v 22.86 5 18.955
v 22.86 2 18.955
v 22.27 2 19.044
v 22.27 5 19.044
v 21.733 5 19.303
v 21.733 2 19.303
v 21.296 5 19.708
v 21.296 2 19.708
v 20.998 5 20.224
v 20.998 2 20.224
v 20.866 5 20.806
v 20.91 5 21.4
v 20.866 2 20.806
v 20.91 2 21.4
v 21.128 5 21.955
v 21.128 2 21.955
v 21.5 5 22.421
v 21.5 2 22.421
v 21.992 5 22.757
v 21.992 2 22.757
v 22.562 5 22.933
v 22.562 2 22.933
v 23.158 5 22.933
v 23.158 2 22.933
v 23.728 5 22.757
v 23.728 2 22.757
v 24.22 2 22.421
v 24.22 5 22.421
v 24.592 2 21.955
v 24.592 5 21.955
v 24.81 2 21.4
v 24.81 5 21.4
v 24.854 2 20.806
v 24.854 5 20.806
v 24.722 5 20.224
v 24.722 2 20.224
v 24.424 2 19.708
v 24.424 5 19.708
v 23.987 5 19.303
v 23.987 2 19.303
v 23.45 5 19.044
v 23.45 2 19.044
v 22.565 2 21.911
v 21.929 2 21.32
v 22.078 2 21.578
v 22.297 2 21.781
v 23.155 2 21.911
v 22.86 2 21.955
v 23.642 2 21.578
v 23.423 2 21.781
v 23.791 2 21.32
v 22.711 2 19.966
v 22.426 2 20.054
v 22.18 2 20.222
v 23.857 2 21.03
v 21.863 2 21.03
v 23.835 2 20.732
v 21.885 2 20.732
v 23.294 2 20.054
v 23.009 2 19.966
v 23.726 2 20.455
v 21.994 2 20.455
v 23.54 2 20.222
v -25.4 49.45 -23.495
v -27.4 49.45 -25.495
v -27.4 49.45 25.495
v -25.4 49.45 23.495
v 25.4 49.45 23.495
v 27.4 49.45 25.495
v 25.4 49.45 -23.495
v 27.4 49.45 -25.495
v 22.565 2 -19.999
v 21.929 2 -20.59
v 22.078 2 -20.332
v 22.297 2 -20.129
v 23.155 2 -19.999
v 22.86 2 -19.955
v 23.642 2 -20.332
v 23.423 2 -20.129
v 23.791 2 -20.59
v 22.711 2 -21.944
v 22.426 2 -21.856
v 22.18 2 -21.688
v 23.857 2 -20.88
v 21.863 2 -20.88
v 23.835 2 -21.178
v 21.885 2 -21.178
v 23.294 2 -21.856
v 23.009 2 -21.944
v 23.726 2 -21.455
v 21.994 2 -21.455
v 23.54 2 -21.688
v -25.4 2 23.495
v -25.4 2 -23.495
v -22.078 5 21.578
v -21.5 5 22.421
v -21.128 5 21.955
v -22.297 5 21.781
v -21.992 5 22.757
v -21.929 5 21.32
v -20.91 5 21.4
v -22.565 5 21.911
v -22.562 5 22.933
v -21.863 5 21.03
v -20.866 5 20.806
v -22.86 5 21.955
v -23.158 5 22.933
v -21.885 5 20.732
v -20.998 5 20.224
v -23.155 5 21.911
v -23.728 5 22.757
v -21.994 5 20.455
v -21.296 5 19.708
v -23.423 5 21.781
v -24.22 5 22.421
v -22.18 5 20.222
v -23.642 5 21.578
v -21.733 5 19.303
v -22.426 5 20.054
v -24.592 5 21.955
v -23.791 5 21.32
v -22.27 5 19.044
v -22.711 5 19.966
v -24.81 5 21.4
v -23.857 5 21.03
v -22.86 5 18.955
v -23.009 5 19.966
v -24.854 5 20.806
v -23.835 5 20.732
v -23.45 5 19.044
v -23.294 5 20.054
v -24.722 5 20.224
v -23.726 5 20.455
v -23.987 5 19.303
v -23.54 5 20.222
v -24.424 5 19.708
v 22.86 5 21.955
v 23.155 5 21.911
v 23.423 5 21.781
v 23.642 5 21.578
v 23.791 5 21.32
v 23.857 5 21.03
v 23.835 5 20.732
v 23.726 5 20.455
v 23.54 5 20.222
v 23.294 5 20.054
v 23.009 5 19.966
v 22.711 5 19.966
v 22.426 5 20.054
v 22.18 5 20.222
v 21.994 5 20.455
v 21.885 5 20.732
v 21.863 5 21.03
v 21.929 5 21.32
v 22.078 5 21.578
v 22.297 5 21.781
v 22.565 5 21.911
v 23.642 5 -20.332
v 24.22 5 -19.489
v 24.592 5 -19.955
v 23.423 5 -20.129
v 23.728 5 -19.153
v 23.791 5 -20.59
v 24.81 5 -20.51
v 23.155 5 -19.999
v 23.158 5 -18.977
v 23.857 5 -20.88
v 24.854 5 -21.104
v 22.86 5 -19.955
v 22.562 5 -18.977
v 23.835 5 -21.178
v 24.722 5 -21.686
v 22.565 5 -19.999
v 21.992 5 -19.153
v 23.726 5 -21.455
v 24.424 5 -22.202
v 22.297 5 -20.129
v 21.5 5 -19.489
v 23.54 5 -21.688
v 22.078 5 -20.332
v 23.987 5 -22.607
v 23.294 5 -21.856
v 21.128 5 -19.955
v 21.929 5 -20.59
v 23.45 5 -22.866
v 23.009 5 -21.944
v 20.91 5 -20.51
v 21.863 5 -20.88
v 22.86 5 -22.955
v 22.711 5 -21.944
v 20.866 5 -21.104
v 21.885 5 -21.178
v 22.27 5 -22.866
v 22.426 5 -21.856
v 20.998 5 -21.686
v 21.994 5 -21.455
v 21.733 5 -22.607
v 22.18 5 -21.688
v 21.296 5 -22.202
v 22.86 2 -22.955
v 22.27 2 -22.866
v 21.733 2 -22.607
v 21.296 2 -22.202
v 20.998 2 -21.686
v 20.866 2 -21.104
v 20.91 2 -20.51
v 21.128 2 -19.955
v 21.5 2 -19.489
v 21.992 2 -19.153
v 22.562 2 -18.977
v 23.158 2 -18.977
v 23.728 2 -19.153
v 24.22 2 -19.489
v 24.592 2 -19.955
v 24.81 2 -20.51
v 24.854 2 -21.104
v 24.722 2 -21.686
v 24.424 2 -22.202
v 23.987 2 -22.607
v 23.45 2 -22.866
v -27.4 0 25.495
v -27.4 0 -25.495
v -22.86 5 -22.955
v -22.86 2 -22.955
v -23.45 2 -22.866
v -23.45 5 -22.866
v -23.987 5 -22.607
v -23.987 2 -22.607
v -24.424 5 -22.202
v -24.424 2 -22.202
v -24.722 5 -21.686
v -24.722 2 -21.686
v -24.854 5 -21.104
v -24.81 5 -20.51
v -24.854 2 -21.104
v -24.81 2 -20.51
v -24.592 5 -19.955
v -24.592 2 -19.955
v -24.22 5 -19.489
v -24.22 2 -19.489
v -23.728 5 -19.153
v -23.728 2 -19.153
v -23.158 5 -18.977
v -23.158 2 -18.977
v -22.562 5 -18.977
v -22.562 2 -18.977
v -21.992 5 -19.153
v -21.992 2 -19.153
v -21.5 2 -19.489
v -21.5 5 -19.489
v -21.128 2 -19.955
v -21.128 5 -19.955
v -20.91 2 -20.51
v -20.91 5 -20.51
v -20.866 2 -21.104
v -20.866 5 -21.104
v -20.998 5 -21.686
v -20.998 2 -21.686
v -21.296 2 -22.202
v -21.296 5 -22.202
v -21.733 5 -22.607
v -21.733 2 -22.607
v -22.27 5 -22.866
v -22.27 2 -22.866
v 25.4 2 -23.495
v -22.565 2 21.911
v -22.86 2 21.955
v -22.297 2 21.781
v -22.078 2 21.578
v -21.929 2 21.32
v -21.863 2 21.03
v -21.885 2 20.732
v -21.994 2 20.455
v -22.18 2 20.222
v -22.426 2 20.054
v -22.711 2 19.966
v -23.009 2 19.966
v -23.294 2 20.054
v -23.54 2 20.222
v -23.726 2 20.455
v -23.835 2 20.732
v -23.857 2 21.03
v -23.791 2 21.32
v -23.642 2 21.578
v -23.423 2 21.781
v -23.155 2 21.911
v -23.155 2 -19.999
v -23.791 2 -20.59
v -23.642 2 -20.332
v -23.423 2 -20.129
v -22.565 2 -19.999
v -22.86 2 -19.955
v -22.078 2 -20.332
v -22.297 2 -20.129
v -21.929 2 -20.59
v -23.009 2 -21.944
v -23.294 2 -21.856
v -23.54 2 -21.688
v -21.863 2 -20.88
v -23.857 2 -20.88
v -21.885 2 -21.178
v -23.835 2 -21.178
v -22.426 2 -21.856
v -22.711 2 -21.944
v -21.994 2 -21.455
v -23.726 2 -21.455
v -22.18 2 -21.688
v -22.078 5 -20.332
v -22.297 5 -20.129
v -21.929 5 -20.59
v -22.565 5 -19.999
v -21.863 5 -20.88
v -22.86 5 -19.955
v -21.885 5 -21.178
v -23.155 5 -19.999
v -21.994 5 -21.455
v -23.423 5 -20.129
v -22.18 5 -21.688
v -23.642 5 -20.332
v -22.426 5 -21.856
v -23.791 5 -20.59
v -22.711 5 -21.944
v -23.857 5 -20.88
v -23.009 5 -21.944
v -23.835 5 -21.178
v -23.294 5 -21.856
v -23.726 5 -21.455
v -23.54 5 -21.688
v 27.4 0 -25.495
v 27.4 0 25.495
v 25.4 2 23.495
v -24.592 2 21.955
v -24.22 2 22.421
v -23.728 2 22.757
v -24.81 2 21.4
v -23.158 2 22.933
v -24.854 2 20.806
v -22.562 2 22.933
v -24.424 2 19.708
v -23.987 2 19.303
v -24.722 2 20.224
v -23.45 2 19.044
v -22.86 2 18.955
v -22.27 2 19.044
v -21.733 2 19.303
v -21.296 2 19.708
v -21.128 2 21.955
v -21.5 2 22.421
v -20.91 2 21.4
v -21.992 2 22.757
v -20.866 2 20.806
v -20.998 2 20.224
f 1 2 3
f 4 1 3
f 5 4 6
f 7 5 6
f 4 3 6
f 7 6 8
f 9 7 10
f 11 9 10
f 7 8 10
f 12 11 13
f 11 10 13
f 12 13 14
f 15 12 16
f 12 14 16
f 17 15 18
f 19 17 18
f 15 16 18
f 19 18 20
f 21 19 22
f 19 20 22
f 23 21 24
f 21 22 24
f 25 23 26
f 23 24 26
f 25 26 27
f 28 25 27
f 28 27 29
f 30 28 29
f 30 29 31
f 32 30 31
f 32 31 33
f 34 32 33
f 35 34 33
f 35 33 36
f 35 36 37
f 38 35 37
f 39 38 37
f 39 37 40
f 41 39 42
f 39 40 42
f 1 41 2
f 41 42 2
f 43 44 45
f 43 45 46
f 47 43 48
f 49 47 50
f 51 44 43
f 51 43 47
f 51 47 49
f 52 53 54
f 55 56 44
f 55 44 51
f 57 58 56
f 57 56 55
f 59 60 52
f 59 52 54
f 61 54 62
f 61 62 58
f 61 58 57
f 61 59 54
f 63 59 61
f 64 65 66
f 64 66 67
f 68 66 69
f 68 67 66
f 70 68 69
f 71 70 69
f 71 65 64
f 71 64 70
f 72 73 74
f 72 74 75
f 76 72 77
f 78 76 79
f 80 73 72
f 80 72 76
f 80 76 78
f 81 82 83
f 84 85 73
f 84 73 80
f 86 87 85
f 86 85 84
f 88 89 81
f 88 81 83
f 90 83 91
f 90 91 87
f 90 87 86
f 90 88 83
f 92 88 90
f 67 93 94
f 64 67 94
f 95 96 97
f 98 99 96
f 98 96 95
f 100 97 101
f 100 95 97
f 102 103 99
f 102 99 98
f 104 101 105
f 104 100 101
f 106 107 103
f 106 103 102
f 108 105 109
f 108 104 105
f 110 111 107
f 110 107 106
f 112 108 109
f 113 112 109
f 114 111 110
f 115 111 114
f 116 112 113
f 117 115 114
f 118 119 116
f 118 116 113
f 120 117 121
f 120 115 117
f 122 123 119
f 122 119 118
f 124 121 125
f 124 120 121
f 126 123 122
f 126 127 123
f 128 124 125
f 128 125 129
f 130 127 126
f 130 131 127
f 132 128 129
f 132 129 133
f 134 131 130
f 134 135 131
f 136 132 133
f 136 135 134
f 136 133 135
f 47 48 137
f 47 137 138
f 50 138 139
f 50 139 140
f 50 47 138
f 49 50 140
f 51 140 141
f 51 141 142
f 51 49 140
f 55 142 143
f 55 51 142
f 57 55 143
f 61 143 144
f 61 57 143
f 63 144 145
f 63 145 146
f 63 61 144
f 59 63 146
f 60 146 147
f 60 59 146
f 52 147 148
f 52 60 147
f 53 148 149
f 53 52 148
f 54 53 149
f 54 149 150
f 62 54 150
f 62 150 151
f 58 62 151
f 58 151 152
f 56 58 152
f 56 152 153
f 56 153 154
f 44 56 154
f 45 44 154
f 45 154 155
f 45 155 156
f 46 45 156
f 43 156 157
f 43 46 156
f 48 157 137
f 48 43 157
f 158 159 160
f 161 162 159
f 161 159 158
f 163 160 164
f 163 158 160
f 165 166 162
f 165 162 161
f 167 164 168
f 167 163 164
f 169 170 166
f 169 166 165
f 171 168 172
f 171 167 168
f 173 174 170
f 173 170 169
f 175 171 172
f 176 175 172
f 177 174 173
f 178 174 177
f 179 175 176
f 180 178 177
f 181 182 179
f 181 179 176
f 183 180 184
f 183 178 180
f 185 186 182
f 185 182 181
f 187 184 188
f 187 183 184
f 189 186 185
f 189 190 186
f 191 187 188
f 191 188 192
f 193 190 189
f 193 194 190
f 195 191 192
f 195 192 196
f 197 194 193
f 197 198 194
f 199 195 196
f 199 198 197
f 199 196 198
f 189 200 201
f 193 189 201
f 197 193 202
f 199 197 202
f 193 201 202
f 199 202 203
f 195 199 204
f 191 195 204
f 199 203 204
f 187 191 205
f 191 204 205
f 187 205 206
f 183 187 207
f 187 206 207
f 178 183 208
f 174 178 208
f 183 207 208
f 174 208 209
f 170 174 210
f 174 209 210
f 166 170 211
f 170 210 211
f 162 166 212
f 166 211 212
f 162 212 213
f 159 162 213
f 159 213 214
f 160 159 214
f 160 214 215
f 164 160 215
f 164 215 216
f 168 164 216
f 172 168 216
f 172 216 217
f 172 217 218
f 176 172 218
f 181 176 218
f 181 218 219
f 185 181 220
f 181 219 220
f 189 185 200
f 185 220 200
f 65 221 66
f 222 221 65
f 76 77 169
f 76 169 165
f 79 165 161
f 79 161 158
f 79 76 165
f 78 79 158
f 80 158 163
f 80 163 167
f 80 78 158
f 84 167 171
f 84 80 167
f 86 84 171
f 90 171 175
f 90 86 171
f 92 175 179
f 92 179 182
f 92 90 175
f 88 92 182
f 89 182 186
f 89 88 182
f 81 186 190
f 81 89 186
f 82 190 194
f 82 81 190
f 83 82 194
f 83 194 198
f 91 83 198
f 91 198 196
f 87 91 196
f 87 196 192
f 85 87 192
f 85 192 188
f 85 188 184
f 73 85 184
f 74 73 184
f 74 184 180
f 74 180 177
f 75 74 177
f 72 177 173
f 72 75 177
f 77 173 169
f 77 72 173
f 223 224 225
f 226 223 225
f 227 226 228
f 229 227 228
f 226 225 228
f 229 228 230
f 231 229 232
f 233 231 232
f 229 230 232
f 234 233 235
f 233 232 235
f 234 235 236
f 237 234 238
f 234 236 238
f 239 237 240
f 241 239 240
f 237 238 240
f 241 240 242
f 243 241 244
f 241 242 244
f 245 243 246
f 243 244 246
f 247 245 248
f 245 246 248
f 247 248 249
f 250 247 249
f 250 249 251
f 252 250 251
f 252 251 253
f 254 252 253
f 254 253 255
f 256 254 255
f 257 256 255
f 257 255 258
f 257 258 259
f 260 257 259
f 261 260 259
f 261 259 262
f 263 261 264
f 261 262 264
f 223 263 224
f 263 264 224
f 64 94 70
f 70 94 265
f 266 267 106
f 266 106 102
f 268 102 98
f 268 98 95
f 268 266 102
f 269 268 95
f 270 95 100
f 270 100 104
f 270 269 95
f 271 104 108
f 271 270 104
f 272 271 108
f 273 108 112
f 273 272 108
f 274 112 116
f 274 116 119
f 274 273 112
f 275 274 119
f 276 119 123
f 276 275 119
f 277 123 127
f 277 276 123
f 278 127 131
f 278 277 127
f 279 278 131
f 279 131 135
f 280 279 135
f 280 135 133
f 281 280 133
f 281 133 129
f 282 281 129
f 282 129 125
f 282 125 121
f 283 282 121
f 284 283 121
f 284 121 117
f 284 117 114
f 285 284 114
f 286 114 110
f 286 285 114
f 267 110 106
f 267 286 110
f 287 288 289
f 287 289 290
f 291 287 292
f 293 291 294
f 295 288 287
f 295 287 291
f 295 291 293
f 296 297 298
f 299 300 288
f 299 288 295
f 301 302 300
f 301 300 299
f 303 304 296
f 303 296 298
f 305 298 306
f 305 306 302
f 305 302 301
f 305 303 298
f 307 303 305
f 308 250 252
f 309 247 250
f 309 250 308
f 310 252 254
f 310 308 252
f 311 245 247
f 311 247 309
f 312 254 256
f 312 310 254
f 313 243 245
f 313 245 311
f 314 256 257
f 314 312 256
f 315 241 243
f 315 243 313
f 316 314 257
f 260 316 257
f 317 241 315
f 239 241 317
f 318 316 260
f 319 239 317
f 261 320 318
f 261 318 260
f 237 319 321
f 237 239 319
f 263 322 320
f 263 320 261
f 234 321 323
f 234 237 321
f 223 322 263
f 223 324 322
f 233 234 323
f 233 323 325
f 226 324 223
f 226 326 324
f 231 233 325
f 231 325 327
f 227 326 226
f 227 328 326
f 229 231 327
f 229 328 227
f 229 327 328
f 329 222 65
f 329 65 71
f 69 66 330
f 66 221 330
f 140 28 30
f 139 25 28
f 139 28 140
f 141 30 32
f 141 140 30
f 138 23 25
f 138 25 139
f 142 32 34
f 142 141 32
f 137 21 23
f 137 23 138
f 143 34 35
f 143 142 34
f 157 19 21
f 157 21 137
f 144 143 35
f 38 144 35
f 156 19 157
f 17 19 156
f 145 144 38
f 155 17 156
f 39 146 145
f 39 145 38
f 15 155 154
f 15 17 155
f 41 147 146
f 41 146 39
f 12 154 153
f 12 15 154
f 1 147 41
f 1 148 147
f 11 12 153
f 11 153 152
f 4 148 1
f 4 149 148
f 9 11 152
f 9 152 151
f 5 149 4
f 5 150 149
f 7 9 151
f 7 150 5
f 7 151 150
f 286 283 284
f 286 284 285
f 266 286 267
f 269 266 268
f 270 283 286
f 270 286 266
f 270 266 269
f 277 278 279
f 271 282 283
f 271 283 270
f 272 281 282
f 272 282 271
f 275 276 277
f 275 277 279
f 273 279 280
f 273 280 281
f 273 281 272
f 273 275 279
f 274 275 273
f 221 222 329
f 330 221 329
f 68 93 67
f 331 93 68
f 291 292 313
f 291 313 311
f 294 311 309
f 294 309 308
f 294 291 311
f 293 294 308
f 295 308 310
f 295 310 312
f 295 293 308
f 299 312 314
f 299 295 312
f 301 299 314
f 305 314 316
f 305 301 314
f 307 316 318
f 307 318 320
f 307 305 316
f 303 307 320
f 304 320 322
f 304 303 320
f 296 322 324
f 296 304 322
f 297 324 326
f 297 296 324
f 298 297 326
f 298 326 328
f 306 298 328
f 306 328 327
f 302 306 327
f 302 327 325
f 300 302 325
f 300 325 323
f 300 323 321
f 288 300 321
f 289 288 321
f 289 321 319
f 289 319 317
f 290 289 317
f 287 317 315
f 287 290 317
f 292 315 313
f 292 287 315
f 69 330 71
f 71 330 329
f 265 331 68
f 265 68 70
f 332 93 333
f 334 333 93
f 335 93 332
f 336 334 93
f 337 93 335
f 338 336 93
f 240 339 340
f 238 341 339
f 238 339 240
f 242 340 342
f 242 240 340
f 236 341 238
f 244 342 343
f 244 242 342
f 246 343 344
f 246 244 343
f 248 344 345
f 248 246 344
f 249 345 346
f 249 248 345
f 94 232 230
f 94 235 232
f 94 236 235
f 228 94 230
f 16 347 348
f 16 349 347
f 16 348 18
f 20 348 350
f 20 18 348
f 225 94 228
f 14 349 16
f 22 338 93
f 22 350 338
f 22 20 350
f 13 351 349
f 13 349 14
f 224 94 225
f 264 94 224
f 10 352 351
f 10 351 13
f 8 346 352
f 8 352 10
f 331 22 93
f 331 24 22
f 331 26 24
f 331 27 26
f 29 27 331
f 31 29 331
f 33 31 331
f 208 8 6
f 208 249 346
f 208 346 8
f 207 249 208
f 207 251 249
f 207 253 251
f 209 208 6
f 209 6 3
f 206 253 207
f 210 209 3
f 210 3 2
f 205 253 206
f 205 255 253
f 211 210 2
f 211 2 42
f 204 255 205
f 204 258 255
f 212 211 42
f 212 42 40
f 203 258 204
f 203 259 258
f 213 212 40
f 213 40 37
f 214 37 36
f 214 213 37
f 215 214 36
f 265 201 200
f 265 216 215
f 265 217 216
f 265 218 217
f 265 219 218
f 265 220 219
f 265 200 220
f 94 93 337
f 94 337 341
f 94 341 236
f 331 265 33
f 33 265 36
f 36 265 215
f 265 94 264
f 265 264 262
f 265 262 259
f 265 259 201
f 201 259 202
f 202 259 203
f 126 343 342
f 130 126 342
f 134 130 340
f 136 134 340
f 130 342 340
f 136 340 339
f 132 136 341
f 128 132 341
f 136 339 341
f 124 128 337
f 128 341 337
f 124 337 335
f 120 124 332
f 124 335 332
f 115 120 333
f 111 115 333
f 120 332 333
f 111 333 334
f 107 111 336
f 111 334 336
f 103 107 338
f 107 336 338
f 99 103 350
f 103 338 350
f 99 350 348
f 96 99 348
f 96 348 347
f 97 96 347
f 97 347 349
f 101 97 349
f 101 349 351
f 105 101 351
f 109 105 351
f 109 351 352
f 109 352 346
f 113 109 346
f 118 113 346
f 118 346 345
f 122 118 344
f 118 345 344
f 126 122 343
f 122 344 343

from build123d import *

# Parameters (mm, degrees)
SKETCH1_W           = 54.800000096
SKETCH1_H           = 50.990000096
BOSS_EXTRUDE2_DEPTH = 2
SKETCH2_R           = 2
SKETCH2_R_2         = 1
BOSS_EXTRUDE3_DEPTH = 3
SKETCH3_W           = 54.800000096
SKETCH3_H           = 50.990000096
SKETCH3_W_2         = 50.800000096
SKETCH3_H_2         = 46.990000096
BOSS_EXTRUDE5_DEPTH = 47.45


with BuildPart() as part:
    # Sketch1 → Boss-Extrude2 (new body)
    with BuildSketch(Plane(origin=(0, 0, 0), x_dir=(1, 0, 0), z_dir=(0, 1, 0))):
        Rectangle(SKETCH1_W, SKETCH1_H)
    extrude(amount=BOSS_EXTRUDE2_DEPTH)

    # Sketch2 → Boss-Extrude3 (add)
    # profile 1 of 4: a face of its own
    with BuildSketch(Plane(origin=(0, 2, 0), x_dir=(1, 0, 0), z_dir=(0, 1, 0))):
        with Locations(Location((-22.86, 20.955, 0), (0, 0, 90))):
            Circle(SKETCH2_R)
        with Locations(Location((-22.86, 20.955, 0), (0, 0, 270))):
            Circle(SKETCH2_R_2, mode=Mode.SUBTRACT)
    # profile 2 of 4: a face of its own
    with BuildSketch(Plane(origin=(0, 2, 0), x_dir=(1, 0, 0), z_dir=(0, 1, 0))):
        with Locations(Location((22.86, 20.955, 0), (0, 0, 90))):
            Circle(SKETCH2_R)
        with Locations(Location((22.86, 20.955, 0), (0, 0, 270))):
            Circle(SKETCH2_R_2, mode=Mode.SUBTRACT)
    # profile 3 of 4: a face of its own
    with BuildSketch(Plane(origin=(0, 2, 0), x_dir=(1, 0, 0), z_dir=(0, 1, 0))):
        with Locations(Location((22.86, -20.955, 0), (0, 0, 90))):
            Circle(SKETCH2_R)
        with Locations(Location((22.86, -20.955, 0), (0, 0, 270))):
            Circle(SKETCH2_R_2, mode=Mode.SUBTRACT)
    # profile 4 of 4: a face of its own
    with BuildSketch(Plane(origin=(0, 2, 0), x_dir=(1, 0, 0), z_dir=(0, 1, 0))):
        with Locations(Location((-22.86, -20.955, 0), (0, 0, 90))):
            Circle(SKETCH2_R)
        with Locations(Location((-22.86, -20.955, 0), (0, 0, 270))):
            Circle(SKETCH2_R_2, mode=Mode.SUBTRACT)
    extrude(amount=BOSS_EXTRUDE3_DEPTH)

    # Sketch3 → Boss-Extrude5 (add)
    with BuildSketch(Plane(origin=(0, 2, 0), x_dir=(1, 0, 0), z_dir=(0, 1, 0))):
        Rectangle(SKETCH3_W, SKETCH3_H)
        Rectangle(SKETCH3_W_2, SKETCH3_H_2, mode=Mode.SUBTRACT)
    extrude(amount=BOSS_EXTRUDE5_DEPTH)


solid = part.part
